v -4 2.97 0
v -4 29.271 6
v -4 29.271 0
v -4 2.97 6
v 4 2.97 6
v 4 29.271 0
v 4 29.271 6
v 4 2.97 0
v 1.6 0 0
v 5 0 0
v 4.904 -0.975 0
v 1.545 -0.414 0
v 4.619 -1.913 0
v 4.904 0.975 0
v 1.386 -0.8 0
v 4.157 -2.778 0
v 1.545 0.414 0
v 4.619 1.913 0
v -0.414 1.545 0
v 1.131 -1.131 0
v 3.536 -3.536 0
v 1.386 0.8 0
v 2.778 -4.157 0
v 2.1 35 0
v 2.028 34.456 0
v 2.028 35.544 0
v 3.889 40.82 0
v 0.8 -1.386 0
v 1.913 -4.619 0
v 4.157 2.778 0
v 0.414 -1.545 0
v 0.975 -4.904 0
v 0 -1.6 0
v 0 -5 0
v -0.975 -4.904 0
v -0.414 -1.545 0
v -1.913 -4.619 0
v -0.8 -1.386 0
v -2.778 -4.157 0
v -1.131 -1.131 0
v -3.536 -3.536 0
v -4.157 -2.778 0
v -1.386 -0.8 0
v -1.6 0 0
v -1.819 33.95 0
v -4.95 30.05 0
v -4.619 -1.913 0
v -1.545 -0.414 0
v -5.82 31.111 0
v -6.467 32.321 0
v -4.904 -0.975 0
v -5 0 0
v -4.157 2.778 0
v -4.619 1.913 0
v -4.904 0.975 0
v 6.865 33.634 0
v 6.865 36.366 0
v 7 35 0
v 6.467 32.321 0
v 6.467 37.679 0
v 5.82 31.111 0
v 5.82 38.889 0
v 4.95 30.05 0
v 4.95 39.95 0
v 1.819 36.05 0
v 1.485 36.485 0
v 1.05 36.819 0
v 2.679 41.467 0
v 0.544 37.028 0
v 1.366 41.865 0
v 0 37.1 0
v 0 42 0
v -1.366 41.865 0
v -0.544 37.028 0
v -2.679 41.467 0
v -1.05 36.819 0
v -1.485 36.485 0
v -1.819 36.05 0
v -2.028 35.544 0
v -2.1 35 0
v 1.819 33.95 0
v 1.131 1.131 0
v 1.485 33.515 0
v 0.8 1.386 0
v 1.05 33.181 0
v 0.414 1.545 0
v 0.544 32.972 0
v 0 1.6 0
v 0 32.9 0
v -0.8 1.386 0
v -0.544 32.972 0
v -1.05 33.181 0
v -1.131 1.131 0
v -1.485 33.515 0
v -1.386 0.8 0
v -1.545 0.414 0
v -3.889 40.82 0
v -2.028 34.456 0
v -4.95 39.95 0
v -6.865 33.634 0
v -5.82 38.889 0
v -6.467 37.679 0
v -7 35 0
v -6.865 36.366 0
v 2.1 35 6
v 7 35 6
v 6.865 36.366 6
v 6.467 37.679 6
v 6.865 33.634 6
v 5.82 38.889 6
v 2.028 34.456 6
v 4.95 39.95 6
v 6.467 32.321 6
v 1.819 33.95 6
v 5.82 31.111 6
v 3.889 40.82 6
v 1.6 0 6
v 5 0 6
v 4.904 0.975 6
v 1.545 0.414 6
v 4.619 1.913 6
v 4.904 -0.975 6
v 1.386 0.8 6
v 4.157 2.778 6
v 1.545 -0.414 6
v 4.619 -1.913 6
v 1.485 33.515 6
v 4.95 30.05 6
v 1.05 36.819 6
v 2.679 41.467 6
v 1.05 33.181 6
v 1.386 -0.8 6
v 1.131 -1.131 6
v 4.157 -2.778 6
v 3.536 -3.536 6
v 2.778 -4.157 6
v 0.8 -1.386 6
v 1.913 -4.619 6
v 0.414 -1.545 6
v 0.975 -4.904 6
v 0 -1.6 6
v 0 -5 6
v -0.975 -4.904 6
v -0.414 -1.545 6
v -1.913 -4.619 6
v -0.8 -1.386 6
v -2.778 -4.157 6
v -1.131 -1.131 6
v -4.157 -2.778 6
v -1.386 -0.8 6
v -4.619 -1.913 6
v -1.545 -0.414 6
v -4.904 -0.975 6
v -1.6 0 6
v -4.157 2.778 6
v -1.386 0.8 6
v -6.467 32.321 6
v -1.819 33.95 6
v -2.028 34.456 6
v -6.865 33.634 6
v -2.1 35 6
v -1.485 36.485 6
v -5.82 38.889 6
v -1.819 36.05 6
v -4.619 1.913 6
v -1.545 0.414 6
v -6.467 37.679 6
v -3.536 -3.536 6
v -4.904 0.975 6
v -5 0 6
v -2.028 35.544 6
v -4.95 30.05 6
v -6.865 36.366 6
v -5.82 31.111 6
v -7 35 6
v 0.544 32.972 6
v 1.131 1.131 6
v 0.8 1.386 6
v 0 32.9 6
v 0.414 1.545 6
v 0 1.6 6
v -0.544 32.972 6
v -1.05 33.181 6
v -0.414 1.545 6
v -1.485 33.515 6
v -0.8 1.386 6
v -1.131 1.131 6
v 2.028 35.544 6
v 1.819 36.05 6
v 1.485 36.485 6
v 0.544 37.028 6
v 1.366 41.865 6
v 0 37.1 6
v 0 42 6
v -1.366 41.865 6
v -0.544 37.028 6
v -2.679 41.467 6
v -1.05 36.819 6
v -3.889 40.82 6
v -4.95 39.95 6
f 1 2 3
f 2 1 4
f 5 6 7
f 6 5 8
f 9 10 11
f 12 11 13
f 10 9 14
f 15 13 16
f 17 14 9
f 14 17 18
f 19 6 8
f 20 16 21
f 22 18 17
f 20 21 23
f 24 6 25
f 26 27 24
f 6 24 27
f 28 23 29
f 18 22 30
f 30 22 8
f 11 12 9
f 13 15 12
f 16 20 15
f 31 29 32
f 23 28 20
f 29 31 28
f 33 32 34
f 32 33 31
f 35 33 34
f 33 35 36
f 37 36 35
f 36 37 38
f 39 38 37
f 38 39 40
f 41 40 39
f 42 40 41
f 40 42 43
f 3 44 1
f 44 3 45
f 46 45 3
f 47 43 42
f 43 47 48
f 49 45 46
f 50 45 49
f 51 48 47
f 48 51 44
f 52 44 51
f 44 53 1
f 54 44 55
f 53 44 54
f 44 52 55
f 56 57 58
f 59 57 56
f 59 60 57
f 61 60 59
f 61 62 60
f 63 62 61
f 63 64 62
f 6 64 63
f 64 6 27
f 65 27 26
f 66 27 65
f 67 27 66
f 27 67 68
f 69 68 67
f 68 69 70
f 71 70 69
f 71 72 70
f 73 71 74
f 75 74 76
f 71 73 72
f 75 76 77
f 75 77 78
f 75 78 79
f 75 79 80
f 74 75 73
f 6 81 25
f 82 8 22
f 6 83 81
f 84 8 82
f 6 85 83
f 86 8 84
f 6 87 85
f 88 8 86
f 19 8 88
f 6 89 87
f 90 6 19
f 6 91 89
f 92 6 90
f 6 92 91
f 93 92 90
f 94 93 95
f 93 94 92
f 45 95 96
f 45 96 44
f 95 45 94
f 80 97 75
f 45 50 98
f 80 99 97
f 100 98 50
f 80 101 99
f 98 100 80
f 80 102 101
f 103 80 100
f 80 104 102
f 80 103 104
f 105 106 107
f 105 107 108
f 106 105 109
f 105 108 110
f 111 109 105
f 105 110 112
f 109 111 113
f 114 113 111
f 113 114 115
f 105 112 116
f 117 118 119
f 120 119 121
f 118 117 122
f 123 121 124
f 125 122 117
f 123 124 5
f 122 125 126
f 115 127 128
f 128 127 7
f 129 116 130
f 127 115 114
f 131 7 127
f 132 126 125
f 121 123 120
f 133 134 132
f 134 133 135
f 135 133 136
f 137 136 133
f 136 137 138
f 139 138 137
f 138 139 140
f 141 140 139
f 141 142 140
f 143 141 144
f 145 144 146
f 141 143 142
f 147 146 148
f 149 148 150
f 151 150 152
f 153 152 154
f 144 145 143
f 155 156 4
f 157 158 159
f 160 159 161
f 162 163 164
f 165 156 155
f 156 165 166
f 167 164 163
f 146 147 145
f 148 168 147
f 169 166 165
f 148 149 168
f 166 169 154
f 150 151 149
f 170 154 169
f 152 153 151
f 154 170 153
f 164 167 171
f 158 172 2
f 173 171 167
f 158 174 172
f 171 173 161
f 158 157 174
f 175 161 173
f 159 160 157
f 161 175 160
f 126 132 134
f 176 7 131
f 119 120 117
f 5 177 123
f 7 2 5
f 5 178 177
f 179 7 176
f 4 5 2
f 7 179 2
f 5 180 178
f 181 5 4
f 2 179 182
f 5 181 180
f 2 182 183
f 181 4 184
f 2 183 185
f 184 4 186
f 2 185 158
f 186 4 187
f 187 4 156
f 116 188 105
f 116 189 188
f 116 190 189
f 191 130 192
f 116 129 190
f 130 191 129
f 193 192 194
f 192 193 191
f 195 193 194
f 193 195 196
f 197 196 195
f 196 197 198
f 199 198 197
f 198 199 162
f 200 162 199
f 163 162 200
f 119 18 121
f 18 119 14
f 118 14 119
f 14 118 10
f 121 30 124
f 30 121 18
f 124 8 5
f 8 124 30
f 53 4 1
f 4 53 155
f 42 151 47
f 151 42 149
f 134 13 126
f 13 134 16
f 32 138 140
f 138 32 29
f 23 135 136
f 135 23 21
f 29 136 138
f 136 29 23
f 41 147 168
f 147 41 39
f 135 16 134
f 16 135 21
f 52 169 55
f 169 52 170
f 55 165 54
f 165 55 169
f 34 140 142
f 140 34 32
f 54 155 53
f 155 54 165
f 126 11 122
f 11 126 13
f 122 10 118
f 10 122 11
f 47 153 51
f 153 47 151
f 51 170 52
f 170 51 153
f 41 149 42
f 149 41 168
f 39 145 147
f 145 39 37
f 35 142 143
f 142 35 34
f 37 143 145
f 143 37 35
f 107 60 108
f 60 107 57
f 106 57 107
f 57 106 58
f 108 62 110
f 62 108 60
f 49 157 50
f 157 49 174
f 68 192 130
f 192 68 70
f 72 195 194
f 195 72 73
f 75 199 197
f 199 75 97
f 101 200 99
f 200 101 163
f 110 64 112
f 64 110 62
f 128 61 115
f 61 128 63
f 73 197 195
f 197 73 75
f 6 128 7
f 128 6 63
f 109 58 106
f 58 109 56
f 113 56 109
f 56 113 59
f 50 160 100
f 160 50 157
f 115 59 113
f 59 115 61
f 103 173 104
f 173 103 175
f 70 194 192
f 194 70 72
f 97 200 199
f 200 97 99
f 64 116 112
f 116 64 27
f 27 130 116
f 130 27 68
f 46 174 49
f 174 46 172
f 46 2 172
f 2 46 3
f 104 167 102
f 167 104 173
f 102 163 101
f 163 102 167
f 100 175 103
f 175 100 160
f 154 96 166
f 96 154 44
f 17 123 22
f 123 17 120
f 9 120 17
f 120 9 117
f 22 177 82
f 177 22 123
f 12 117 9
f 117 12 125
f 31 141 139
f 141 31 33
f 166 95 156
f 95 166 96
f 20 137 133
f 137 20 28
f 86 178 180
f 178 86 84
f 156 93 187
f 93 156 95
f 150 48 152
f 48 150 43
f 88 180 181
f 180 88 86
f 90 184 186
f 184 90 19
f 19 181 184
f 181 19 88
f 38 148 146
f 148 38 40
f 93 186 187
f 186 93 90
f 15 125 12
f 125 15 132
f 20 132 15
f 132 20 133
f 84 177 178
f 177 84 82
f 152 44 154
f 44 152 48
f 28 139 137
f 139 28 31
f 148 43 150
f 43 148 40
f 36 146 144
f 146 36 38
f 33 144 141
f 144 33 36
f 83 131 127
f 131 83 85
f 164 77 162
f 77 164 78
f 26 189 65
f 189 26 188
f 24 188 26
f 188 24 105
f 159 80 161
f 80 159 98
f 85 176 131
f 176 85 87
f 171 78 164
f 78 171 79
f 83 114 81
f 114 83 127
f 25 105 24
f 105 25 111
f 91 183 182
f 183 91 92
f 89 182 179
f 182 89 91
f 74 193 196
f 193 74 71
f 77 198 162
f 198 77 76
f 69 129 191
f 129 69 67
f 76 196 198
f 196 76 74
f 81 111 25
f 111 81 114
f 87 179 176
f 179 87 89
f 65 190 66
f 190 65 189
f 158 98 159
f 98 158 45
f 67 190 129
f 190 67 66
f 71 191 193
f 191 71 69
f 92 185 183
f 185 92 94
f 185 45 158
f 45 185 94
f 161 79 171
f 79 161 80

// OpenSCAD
// file: ../common.scad
/*
 * WAVE OCEAN V10 - COMMON PARAMETERS
 *
 * Shared constants, tolerances, and hardware specifications
 * All dimensions in mm
 *
 * MECHANISM: Helical groove cam drives 24 slats via follower arms
 * - Worm rotates around X axis
 * - Groove follows helix at radius GROOVE_RADIUS
 * - Follower rollers ride in groove, push slats up/down
 * - Phase difference along X creates traveling wave illusion
 */

// ============================================
// PRINT TOLERANCES (tune for your printer)
// ============================================

TOL_CLEARANCE = 0.2;         // Shaft in hole clearance
TOL_PRESS_FIT = -0.15;       // Bearing press-fit interference
TOL_SLIDING = 0.4;           // Sliding fit (guide slots)
TOL_SCREW_HOLE = 0.2;        // Screw hole clearance

// ============================================
// HARDWARE - BEARINGS
// ============================================

// 608 bearing (worm shaft)
BEARING_608_ID = 8;
BEARING_608_OD = 22;
BEARING_608_H = 7;

// 624 bearing (follower rollers)
BEARING_624_ID = 4;
BEARING_624_OD = 13;
BEARING_624_H = 5;

// ============================================
// HARDWARE - FASTENERS
// ============================================

M3_HOLE_DIA = 3 + TOL_SCREW_HOLE;      // 3.2mm
M3_HEAD_DIA = 5.5;
M3_HEAD_H = 3;
M3_NUT_FLAT = 5.5;
M3_NUT_H = 2.4;
M3_INSERT_DIA = 4.0;                    // Heat-set insert hole
M3_INSERT_DEPTH = 5;

// ============================================
// HARDWARE - SHAFTS AND PINS
// ============================================

WORM_SHAFT_DIA = 8;
WORM_SHAFT_LENGTH = 280;               // Extends beyond worm for bearings

ROLLER_AXLE_DIA = 4;
ROLLER_AXLE_LENGTH = 12;

PIVOT_PIN_DIA = 3;
PIVOT_PIN_LENGTH = 15;

// ============================================
// WORM CAM DIMENSIONS
// ============================================

WORM_LENGTH = 200;
WORM_OUTER_RADIUS = 20;              // 40mm diameter (bigger for deeper groove)
WORM_CORE_RADIUS = 10;               // 20mm diameter core
WORM_SHAFT_HOLE = WORM_SHAFT_DIA + TOL_CLEARANCE;  // 8.2mm

// Groove sized to contain 624 bearing roller
GROOVE_WIDTH = BEARING_624_H + 2;    // 7mm wide (bearing + clearance)
GROOVE_DEPTH = BEARING_624_OD/2 + 3; // 9.5mm deep (half bearing + margin)
GROOVE_RADIUS = WORM_OUTER_RADIUS - GROOVE_DEPTH/2;  // ~15mm from center

HELIX_PITCH = 25;                    // 25mm per rotation = 8 turns over 200mm

// ============================================
// SLAT DIMENSIONS
// ============================================

NUM_SLATS = 24;
SLAT_SPACING = WORM_LENGTH / NUM_SLATS;  // 8.33mm

SLAT_WIDTH = 5;                       // X dimension (slightly wider)
SLAT_DEPTH = 30;                      // Y dimension (narrower)
SLAT_HEIGHT = 40;                     // Z dimension

// Wave motion amplitude (half of total travel)
WAVE_AMPLITUDE = 10;                  // ±10mm vertical motion

// ============================================
// FOLLOWER ARM DIMENSIONS
// ============================================

ARM_LENGTH = 35;                      // Pivot to roller center (LONGER)
ARM_WIDTH = 8;
ARM_THICKNESS = 6;

PIVOT_HOLE = PIVOT_PIN_DIA + TOL_CLEARANCE;    // 3.2mm
ROLLER_AXLE_HOLE = ROLLER_AXLE_DIA + TOL_CLEARANCE;  // 4.2mm

// ============================================
// SLAT BRACKET DIMENSIONS
// ============================================

BRACKET_WIDTH = 12;
BRACKET_DEPTH = 20;
BRACKET_HEIGHT = 25;

// ============================================
// GUIDE RAIL DIMENSIONS
// ============================================

GUIDE_LENGTH = 210;
GUIDE_HEIGHT = 30;                    // Taller for more travel
GUIDE_DEPTH = 10;
GUIDE_WALL = 3;

SLOT_WIDTH = SLAT_WIDTH + TOL_SLIDING;   // Slat slides in slot, not bracket tab
SLOT_HEIGHT = WAVE_AMPLITUDE * 2 + 10;   // Allow full travel + margin

// ============================================
// BEARING BLOCK DIMENSIONS
// ============================================

BEARING_BLOCK_WIDTH = 35;
BEARING_BLOCK_DEPTH = 35;
BEARING_BLOCK_HEIGHT = 30;

BEARING_POCKET_DIA = BEARING_608_OD + TOL_PRESS_FIT;  // 21.85mm
BEARING_POCKET_DEPTH = BEARING_608_H + 1;             // 8mm

// ============================================
// BASE PLATE DIMENSIONS
// ============================================

BASE_LENGTH = 280;                    // Longer to fit everything
BASE_WIDTH = 100;                     // Wider for stability
BASE_THICKNESS = 5;

// ============================================
// MOTOR MOUNT DIMENSIONS
// ============================================

N20_BODY_DIA = 12;
N20_BODY_LENGTH = 15;
N20_GEARBOX_DIA = 10;
N20_GEARBOX_LENGTH = 12;
N20_SHAFT_DIA = 3;
N20_SHAFT_LENGTH = 10;

// ============================================
// ASSEMBLY POSITIONS
// ============================================

// Worm center position
// Shaft runs along X axis at this Z height
WORM_CENTER_Z = BASE_THICKNESS + BEARING_BLOCK_HEIGHT;  // 35mm

// Guide rail positions (front and back of slats)
// Slats are centered at Y=0, spanning ±SLAT_DEPTH/2
GUIDE_FRONT_Y = -SLAT_DEPTH/2 - GUIDE_DEPTH/2;   // -20
GUIDE_BACK_Y = SLAT_DEPTH/2 + GUIDE_DEPTH/2;     // +20

// Guide rail Z - slats hang down from here
// Positioned so slat bottom can reach groove at top of worm
GUIDE_Z = WORM_CENTER_Z + WORM_OUTER_RADIUS + SLAT_HEIGHT/2 + 5;  // 80mm

// Bearing block X positions (at ends of worm, inward facing)
BEARING_L_X = -WORM_LENGTH/2 - BEARING_BLOCK_WIDTH/2;   // -117.5
BEARING_R_X = WORM_LENGTH/2 + BEARING_BLOCK_WIDTH/2;    // +117.5

// Motor mount X position (beyond right bearing block)
MOTOR_MOUNT_X = BEARING_R_X + BEARING_BLOCK_WIDTH/2 + 30;

// ============================================
// COLORS (for assembly visualization)
// ============================================

C_WORM = [0.75, 0.55, 0.2];
C_SLAT = [0.2, 0.45, 0.75];
C_BRACKET = [0.4, 0.4, 0.45];
C_ARM = [0.5, 0.5, 0.55];
C_GUIDE = [0.35, 0.35, 0.4];
C_BEARING_BLOCK = [0.3, 0.35, 0.4];
C_BASE = [0.25, 0.25, 0.3];
C_SHAFT = [0.6, 0.6, 0.65];
C_BEARING = [0.7, 0.7, 0.75];
C_MOTOR = [0.3, 0.3, 0.35];

// ============================================
// HELPER FUNCTIONS
// ============================================

// Helix angle at position X along worm (in degrees)
function helix_angle(x) = (x / HELIX_PITCH) * 360;

// Combined phase: helix position + shaft rotation
function phase(x, theta) = helix_angle(x) + theta;

// Groove center position in Y-Z plane (polar coordinates from shaft)
// Y = radius * sin(angle), Z = center + radius * cos(angle)
function groove_y(x, theta) = GROOVE_RADIUS * sin(phase(x, theta));
function groove_z(x, theta) = WORM_CENTER_Z + GROOVE_RADIUS * cos(phase(x, theta));

// Slat X position (evenly spaced along worm length)
function slat_x(i) = i * SLAT_SPACING - WORM_LENGTH/2 + SLAT_SPACING/2;

// Slat Z position - follows groove Z position via follower arm
// When groove is at top (cos=1), slat is pushed up
// When groove is at bottom (cos=-1), slat drops down
function slat_z(i, theta) =
    let(x = slat_x(i))
    GUIDE_Z + GROOVE_RADIUS * cos(phase(x, theta)) - GROOVE_RADIUS;

// ============================================
// CLEARANCE VERIFICATION
// ============================================

// Slat gap: SLAT_SPACING - SLAT_WIDTH = 8.33 - 5 = 3.33mm ✓
// Arm reach: ARM_LENGTH = 35mm, needs to reach ~30mm ✓
// Groove depth: 9.5mm, bearing radius 6.5mm ✓
// Wave travel: ±GROOVE_RADIUS * cos variation = ±15mm

// ============================================
// QUALITY SETTINGS
// ============================================

$fn = 48;  // Default facets
// main file
/*
 * FOLLOWER ARM - Pivoting Arm with Roller
 *
 * Printable part: 24x
 * Print orientation: Flat (Z up)
 *
 * Features:
 * - Pivot hole at one end (connects to slat pivot boss)
 * - Roller axle hole at other end (holds 624 bearing)
 * - Arm swings in Y-Z plane to track worm groove
 *
 * Built lying flat: pivot at origin, roller at +Y
 * When installed: rotated so arm hangs down from slat
 */

include <../common.scad>

$fn = 32;

// ============================================
// ARM PARAMETERS
// ============================================

ARM_MAIN_LENGTH = ARM_LENGTH;        // 35mm from pivot to roller
ARM_PIVOT_BOSS_DIA = 10;
ARM_ROLLER_BOSS_DIA = 14;

// ============================================
// MAIN FOLLOWER ARM MODULE
// ============================================

module follower_arm() {
    difference() {
        union() {
            // Main arm body
            arm_body();

            // Pivot boss
            pivot_boss();

            // Roller boss
            roller_boss();
        }

        // Pivot hole
        pivot_hole();

        // Roller axle hole
        roller_axle_hole();
    }
}

// ============================================
// ARM BODY
// ============================================

module arm_body() {
    // Straight beam from pivot (origin) to roller (+Y)
    hull() {
        cylinder(d=ARM_WIDTH, h=ARM_THICKNESS);

        translate([0, ARM_MAIN_LENGTH, 0])
            cylinder(d=ARM_WIDTH, h=ARM_THICKNESS);
    }
}

// ============================================
// PIVOT BOSS
// ============================================

module pivot_boss() {
    cylinder(d=ARM_PIVOT_BOSS_DIA, h=ARM_THICKNESS);
}

// ============================================
// ROLLER BOSS
// ============================================

module roller_boss() {
    translate([0, ARM_MAIN_LENGTH, 0])
        cylinder(d=ARM_ROLLER_BOSS_DIA, h=ARM_THICKNESS);
}

// ============================================
// HOLES
// ============================================

module pivot_hole() {
    translate([0, 0, -1])
        cylinder(d=PIVOT_HOLE, h=ARM_THICKNESS + 2, $fn=24);
}

module roller_axle_hole() {
    translate([0, ARM_MAIN_LENGTH, -1])
        cylinder(d=ROLLER_AXLE_HOLE, h=ARM_THICKNESS + 2, $fn=24);
}

// ============================================
// RENDER
// ============================================

color(C_ARM)
follower_arm();

// Visualization: 624 bearing
%translate([0, ARM_MAIN_LENGTH, ARM_THICKNESS/2])
    cylinder(d=BEARING_624_OD, h=BEARING_624_H, center=true, $fn=32);

// ============================================
// INFO
// ============================================

echo("=== FOLLOWER ARM ===");
echo(str("Length: ", ARM_MAIN_LENGTH, "mm"));
echo(str("Thickness: ", ARM_THICKNESS, "mm"));
echo("Print quantity: 24");
